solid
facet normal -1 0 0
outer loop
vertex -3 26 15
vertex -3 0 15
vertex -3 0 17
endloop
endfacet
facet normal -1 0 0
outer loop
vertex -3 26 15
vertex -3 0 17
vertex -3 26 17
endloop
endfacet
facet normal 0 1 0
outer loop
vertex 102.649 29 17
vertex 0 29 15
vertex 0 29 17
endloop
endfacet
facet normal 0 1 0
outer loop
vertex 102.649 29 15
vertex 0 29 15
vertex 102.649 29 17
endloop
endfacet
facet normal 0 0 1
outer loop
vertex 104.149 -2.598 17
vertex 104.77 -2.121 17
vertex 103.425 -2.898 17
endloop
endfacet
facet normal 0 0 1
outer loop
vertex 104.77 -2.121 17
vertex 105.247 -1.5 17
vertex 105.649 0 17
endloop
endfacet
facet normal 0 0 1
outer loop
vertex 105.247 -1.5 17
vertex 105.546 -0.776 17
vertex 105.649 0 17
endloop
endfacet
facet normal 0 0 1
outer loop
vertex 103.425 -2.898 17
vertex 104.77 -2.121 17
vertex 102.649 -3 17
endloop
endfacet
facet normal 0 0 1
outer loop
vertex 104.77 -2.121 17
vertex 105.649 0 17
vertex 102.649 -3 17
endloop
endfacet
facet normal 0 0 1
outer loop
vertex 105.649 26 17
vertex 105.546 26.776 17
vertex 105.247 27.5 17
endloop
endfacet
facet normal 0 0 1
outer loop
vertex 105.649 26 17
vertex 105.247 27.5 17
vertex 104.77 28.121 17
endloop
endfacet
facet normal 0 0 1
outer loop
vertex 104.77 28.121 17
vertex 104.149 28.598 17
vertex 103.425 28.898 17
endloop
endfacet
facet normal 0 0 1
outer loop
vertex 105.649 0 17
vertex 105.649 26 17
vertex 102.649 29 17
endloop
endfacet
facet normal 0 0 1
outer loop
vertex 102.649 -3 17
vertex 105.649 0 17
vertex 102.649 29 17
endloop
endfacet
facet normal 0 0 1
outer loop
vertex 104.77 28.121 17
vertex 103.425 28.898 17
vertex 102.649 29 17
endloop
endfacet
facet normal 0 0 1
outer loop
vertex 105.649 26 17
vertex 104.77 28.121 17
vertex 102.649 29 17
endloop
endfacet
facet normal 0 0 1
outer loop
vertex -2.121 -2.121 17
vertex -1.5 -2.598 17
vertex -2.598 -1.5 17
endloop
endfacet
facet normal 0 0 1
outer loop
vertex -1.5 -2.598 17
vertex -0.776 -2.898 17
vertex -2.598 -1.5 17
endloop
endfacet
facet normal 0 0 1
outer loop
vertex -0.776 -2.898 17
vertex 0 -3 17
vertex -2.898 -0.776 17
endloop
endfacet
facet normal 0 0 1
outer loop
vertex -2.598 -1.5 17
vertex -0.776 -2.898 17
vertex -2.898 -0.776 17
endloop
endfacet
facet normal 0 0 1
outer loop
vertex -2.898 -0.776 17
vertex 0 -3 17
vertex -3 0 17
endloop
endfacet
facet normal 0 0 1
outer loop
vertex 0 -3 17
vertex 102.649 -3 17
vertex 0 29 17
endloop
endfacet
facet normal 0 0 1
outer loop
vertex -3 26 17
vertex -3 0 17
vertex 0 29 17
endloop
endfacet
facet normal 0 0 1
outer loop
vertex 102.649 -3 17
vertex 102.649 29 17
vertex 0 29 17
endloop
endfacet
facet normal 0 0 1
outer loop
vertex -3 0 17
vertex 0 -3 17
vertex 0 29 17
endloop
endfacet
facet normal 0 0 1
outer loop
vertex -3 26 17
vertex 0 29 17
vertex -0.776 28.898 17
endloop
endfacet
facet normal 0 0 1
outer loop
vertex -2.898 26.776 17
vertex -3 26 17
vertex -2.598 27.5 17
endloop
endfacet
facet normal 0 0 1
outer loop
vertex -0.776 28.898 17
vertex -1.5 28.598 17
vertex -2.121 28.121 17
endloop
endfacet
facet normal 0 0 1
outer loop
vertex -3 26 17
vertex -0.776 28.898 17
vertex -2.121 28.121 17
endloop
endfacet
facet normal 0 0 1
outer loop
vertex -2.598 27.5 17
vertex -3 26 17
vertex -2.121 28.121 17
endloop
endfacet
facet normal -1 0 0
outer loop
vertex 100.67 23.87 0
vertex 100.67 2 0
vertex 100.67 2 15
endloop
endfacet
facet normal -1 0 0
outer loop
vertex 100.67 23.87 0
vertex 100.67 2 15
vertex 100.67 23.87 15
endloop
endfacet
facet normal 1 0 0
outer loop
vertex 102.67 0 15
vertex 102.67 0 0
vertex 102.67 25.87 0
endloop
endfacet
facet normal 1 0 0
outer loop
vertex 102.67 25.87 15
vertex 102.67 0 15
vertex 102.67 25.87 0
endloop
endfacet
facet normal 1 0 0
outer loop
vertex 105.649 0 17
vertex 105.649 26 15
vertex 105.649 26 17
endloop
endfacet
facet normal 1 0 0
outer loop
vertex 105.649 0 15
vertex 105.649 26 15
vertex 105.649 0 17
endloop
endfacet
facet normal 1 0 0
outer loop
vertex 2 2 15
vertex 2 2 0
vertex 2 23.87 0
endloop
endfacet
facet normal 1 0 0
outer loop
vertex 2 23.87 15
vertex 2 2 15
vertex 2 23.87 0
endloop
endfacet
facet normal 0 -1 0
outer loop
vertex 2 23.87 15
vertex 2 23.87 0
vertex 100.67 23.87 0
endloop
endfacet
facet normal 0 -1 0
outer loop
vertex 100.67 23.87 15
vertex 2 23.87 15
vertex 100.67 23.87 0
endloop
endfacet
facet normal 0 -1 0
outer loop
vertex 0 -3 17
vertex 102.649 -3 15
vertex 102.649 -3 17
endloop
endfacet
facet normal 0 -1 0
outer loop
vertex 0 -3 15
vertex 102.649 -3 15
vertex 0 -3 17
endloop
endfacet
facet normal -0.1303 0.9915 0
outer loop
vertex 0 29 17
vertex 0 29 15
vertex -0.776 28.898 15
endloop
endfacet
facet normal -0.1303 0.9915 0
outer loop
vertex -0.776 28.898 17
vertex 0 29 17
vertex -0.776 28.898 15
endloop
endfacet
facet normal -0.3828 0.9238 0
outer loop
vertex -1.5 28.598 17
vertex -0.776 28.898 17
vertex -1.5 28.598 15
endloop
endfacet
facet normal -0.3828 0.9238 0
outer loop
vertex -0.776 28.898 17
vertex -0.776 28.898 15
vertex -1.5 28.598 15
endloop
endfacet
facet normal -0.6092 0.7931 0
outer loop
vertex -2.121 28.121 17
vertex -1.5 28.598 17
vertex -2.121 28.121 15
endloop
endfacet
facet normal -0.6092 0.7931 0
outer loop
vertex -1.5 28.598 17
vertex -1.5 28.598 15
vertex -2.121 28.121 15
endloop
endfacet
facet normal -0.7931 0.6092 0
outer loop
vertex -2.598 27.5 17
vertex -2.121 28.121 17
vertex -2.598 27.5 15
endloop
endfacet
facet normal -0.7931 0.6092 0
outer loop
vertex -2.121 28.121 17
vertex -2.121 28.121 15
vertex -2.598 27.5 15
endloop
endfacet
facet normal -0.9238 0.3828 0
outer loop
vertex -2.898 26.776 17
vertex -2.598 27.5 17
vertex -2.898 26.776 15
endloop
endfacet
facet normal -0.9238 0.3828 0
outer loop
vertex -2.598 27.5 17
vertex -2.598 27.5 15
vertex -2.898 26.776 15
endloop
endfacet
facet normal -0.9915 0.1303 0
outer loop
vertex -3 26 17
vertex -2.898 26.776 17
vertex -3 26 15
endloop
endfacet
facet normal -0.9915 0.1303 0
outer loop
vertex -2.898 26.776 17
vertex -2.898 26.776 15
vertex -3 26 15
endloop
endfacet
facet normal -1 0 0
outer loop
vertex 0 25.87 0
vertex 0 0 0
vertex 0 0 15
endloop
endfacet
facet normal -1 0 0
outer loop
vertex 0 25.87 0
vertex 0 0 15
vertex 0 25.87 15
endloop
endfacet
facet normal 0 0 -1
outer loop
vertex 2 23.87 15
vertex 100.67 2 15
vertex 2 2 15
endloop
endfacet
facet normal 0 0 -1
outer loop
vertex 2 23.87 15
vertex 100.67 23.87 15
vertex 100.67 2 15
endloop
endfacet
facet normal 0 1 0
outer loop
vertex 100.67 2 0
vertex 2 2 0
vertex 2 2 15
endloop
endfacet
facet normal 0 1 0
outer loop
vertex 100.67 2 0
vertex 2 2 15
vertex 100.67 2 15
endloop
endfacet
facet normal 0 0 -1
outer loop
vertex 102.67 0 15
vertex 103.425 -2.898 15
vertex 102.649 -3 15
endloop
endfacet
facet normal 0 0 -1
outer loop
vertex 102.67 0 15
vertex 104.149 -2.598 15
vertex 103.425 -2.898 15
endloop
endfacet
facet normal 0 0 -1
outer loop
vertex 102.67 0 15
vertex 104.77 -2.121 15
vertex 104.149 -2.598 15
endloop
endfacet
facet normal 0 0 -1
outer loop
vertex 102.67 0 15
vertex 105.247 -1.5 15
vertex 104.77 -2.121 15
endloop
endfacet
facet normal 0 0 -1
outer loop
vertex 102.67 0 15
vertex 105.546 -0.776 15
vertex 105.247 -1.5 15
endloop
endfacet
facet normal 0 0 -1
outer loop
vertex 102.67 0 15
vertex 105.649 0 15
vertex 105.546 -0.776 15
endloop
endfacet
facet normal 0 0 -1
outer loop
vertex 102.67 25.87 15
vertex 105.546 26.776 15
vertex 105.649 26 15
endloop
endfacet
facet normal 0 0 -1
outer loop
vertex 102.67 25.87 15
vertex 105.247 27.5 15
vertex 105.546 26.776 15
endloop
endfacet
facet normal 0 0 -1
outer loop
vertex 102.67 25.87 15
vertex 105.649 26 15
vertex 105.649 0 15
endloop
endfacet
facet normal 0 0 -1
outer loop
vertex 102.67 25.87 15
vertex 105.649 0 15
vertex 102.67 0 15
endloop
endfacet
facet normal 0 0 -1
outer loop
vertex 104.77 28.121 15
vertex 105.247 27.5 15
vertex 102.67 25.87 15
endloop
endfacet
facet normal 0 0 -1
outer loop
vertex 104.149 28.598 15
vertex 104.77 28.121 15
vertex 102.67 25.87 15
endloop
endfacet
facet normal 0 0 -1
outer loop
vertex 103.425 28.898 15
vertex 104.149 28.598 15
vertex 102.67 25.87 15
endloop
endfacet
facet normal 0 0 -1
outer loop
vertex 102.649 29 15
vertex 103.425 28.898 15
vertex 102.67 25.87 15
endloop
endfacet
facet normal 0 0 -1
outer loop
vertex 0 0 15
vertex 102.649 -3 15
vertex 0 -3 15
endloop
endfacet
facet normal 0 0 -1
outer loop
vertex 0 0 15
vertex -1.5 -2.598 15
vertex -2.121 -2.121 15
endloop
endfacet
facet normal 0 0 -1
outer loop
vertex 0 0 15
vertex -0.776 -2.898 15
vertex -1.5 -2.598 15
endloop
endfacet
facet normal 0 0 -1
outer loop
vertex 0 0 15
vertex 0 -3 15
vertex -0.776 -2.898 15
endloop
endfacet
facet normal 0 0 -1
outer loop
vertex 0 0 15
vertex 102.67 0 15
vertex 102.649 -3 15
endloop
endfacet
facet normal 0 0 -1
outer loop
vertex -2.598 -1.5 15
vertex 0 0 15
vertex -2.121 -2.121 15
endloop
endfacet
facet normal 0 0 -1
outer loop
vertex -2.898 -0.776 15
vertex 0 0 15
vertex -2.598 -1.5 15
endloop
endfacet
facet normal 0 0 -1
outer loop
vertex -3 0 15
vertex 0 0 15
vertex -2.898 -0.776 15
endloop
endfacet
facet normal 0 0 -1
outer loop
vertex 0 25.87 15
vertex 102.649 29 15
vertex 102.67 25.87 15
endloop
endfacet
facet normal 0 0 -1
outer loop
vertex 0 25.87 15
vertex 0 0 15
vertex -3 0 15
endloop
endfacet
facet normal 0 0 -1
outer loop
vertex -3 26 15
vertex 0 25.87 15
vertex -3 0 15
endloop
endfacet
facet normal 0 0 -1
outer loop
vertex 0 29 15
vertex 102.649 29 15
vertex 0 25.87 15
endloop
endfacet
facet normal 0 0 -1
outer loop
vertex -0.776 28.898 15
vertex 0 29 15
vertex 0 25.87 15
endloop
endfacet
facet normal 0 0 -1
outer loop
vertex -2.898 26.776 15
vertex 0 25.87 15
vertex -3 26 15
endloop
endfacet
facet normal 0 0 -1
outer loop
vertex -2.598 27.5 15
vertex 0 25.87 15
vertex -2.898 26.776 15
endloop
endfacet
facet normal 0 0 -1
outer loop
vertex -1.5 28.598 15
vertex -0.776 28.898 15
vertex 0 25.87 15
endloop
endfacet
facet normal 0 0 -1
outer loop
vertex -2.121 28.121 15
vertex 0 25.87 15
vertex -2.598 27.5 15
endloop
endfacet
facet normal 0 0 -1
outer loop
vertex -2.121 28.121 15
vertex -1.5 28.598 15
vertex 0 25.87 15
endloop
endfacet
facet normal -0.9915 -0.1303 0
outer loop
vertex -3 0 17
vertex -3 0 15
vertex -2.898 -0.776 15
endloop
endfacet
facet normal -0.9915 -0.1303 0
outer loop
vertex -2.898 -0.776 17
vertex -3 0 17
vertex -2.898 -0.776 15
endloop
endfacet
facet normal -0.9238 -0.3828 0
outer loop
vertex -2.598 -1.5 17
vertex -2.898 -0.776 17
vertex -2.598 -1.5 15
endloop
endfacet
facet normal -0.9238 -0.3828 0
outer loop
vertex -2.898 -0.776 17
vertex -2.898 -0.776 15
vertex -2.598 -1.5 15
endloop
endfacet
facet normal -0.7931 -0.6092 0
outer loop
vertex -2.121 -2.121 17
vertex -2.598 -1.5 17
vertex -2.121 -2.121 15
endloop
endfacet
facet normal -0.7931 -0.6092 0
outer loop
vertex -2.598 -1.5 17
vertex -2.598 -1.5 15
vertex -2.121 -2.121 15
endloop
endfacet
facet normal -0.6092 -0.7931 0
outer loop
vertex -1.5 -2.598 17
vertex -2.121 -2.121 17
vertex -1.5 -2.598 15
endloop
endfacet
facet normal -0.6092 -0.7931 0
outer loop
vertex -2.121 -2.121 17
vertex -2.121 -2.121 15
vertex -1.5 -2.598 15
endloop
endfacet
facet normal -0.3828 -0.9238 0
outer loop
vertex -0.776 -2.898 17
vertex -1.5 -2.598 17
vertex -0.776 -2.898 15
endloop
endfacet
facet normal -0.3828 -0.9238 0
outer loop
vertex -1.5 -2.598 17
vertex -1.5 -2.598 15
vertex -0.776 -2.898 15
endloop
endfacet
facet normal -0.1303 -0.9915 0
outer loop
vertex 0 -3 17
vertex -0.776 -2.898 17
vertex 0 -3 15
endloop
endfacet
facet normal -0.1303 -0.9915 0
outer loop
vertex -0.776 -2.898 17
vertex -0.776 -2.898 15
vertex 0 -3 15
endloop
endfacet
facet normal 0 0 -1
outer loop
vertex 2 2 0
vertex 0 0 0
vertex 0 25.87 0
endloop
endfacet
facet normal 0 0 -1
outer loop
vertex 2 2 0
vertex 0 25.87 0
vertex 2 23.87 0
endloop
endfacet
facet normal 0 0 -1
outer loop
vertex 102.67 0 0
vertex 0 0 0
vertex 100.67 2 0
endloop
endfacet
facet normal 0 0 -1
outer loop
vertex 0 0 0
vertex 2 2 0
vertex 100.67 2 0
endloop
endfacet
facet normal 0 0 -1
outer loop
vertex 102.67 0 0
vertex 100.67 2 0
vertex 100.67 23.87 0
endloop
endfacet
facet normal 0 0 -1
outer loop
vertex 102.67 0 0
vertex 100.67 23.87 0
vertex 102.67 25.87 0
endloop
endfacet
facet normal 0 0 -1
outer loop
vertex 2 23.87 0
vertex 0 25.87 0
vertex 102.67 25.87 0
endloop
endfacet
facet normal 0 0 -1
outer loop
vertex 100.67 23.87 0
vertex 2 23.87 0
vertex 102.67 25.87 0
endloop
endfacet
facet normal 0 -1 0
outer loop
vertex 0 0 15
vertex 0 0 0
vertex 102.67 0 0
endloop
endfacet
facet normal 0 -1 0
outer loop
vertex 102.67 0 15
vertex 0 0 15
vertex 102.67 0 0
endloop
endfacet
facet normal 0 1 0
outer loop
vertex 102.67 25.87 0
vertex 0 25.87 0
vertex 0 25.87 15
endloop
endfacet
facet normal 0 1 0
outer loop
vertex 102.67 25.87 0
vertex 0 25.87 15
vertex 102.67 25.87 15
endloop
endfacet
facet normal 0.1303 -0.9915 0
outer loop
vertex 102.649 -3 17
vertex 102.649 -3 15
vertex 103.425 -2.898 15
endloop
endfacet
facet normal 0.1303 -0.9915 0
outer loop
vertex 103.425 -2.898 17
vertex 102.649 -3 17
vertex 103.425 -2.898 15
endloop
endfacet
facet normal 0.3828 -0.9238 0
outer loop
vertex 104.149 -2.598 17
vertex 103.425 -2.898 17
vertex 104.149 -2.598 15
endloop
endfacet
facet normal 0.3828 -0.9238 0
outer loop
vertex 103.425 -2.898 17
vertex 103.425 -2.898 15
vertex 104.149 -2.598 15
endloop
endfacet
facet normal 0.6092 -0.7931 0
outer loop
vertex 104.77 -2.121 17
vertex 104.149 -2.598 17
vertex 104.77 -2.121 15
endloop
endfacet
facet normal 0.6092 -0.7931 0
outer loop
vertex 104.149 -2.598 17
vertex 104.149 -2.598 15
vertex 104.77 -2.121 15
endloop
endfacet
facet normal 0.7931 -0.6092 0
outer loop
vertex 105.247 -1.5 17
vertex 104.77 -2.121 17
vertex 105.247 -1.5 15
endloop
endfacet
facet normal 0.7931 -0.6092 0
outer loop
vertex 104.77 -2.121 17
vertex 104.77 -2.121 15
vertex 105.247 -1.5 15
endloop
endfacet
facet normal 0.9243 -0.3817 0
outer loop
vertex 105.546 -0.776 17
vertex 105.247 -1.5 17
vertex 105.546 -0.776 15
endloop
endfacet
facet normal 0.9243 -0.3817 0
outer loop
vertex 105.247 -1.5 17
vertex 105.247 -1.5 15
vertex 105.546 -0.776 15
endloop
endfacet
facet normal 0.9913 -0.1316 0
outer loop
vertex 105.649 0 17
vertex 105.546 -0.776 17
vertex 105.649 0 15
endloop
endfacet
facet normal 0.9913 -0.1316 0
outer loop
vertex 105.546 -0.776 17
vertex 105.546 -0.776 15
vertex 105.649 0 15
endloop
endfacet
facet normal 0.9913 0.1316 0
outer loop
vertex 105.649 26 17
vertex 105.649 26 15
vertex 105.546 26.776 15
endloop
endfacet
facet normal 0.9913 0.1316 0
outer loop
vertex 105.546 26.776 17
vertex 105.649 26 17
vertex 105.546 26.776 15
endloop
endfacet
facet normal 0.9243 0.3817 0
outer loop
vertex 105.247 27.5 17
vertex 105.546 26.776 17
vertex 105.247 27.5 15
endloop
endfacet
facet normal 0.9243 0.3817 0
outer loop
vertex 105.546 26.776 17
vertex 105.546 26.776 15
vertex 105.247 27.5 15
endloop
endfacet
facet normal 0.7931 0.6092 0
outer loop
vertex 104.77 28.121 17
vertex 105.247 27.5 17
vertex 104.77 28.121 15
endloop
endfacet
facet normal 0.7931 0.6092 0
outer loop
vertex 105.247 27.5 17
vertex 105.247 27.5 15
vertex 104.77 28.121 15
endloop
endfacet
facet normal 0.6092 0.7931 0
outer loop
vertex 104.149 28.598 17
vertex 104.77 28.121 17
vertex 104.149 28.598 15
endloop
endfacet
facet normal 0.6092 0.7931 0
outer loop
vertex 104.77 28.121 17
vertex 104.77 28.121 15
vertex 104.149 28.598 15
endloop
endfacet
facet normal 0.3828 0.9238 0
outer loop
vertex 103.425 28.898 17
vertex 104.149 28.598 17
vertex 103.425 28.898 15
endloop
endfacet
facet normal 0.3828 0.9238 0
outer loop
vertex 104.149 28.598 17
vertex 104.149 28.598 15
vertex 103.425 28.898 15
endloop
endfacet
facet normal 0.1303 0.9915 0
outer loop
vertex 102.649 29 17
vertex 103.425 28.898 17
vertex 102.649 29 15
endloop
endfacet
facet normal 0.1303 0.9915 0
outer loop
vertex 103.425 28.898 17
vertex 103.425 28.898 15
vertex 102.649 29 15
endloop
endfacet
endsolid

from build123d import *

# Parameters (mm, degrees)
SKETCH_W     = 102.67
SKETCH_H     = 25.87
SKETCH_W_2   = 98.67
SKETCH_H_2   = 21.87
PAD_DEPTH    = 15
PAD001_DEPTH = 2


with BuildPart() as part:
    # Sketch → Pad (new body)
    with BuildSketch(Plane.XY):
        with Locations((51.335, 12.935)):
            Rectangle(SKETCH_W, SKETCH_H)
        with Locations((51.335, 12.935)):
            Rectangle(SKETCH_W_2, SKETCH_H_2, mode=Mode.SUBTRACT)
    extrude(amount=PAD_DEPTH)

    # Sketch001 (on Face10 of Pad) → Pad001 (join)
    with BuildSketch(Plane.XY.offset(15)):
        with BuildLine():
            Line((0, 29), (102.648674, 29))
            ThreePointArc((105.648674, 26), (104.769994, 28.12132), (102.648674, 29))
            Line((105.648674, 26), (105.648674, 0))
            ThreePointArc((102.648674, -3), (104.769994, -2.12132), (105.648674, 0))
            Line((102.648674, -3), (0, -3))
            ThreePointArc((-3, 0), (-2.12132, -2.12132), (0, -3))
            Line((-3, 0), (-3, 26))
            ThreePointArc((0, 29), (-2.12132, 28.12132), (-3, 26))
        make_face()
    extrude(amount=PAD001_DEPTH)


solid = part.part
